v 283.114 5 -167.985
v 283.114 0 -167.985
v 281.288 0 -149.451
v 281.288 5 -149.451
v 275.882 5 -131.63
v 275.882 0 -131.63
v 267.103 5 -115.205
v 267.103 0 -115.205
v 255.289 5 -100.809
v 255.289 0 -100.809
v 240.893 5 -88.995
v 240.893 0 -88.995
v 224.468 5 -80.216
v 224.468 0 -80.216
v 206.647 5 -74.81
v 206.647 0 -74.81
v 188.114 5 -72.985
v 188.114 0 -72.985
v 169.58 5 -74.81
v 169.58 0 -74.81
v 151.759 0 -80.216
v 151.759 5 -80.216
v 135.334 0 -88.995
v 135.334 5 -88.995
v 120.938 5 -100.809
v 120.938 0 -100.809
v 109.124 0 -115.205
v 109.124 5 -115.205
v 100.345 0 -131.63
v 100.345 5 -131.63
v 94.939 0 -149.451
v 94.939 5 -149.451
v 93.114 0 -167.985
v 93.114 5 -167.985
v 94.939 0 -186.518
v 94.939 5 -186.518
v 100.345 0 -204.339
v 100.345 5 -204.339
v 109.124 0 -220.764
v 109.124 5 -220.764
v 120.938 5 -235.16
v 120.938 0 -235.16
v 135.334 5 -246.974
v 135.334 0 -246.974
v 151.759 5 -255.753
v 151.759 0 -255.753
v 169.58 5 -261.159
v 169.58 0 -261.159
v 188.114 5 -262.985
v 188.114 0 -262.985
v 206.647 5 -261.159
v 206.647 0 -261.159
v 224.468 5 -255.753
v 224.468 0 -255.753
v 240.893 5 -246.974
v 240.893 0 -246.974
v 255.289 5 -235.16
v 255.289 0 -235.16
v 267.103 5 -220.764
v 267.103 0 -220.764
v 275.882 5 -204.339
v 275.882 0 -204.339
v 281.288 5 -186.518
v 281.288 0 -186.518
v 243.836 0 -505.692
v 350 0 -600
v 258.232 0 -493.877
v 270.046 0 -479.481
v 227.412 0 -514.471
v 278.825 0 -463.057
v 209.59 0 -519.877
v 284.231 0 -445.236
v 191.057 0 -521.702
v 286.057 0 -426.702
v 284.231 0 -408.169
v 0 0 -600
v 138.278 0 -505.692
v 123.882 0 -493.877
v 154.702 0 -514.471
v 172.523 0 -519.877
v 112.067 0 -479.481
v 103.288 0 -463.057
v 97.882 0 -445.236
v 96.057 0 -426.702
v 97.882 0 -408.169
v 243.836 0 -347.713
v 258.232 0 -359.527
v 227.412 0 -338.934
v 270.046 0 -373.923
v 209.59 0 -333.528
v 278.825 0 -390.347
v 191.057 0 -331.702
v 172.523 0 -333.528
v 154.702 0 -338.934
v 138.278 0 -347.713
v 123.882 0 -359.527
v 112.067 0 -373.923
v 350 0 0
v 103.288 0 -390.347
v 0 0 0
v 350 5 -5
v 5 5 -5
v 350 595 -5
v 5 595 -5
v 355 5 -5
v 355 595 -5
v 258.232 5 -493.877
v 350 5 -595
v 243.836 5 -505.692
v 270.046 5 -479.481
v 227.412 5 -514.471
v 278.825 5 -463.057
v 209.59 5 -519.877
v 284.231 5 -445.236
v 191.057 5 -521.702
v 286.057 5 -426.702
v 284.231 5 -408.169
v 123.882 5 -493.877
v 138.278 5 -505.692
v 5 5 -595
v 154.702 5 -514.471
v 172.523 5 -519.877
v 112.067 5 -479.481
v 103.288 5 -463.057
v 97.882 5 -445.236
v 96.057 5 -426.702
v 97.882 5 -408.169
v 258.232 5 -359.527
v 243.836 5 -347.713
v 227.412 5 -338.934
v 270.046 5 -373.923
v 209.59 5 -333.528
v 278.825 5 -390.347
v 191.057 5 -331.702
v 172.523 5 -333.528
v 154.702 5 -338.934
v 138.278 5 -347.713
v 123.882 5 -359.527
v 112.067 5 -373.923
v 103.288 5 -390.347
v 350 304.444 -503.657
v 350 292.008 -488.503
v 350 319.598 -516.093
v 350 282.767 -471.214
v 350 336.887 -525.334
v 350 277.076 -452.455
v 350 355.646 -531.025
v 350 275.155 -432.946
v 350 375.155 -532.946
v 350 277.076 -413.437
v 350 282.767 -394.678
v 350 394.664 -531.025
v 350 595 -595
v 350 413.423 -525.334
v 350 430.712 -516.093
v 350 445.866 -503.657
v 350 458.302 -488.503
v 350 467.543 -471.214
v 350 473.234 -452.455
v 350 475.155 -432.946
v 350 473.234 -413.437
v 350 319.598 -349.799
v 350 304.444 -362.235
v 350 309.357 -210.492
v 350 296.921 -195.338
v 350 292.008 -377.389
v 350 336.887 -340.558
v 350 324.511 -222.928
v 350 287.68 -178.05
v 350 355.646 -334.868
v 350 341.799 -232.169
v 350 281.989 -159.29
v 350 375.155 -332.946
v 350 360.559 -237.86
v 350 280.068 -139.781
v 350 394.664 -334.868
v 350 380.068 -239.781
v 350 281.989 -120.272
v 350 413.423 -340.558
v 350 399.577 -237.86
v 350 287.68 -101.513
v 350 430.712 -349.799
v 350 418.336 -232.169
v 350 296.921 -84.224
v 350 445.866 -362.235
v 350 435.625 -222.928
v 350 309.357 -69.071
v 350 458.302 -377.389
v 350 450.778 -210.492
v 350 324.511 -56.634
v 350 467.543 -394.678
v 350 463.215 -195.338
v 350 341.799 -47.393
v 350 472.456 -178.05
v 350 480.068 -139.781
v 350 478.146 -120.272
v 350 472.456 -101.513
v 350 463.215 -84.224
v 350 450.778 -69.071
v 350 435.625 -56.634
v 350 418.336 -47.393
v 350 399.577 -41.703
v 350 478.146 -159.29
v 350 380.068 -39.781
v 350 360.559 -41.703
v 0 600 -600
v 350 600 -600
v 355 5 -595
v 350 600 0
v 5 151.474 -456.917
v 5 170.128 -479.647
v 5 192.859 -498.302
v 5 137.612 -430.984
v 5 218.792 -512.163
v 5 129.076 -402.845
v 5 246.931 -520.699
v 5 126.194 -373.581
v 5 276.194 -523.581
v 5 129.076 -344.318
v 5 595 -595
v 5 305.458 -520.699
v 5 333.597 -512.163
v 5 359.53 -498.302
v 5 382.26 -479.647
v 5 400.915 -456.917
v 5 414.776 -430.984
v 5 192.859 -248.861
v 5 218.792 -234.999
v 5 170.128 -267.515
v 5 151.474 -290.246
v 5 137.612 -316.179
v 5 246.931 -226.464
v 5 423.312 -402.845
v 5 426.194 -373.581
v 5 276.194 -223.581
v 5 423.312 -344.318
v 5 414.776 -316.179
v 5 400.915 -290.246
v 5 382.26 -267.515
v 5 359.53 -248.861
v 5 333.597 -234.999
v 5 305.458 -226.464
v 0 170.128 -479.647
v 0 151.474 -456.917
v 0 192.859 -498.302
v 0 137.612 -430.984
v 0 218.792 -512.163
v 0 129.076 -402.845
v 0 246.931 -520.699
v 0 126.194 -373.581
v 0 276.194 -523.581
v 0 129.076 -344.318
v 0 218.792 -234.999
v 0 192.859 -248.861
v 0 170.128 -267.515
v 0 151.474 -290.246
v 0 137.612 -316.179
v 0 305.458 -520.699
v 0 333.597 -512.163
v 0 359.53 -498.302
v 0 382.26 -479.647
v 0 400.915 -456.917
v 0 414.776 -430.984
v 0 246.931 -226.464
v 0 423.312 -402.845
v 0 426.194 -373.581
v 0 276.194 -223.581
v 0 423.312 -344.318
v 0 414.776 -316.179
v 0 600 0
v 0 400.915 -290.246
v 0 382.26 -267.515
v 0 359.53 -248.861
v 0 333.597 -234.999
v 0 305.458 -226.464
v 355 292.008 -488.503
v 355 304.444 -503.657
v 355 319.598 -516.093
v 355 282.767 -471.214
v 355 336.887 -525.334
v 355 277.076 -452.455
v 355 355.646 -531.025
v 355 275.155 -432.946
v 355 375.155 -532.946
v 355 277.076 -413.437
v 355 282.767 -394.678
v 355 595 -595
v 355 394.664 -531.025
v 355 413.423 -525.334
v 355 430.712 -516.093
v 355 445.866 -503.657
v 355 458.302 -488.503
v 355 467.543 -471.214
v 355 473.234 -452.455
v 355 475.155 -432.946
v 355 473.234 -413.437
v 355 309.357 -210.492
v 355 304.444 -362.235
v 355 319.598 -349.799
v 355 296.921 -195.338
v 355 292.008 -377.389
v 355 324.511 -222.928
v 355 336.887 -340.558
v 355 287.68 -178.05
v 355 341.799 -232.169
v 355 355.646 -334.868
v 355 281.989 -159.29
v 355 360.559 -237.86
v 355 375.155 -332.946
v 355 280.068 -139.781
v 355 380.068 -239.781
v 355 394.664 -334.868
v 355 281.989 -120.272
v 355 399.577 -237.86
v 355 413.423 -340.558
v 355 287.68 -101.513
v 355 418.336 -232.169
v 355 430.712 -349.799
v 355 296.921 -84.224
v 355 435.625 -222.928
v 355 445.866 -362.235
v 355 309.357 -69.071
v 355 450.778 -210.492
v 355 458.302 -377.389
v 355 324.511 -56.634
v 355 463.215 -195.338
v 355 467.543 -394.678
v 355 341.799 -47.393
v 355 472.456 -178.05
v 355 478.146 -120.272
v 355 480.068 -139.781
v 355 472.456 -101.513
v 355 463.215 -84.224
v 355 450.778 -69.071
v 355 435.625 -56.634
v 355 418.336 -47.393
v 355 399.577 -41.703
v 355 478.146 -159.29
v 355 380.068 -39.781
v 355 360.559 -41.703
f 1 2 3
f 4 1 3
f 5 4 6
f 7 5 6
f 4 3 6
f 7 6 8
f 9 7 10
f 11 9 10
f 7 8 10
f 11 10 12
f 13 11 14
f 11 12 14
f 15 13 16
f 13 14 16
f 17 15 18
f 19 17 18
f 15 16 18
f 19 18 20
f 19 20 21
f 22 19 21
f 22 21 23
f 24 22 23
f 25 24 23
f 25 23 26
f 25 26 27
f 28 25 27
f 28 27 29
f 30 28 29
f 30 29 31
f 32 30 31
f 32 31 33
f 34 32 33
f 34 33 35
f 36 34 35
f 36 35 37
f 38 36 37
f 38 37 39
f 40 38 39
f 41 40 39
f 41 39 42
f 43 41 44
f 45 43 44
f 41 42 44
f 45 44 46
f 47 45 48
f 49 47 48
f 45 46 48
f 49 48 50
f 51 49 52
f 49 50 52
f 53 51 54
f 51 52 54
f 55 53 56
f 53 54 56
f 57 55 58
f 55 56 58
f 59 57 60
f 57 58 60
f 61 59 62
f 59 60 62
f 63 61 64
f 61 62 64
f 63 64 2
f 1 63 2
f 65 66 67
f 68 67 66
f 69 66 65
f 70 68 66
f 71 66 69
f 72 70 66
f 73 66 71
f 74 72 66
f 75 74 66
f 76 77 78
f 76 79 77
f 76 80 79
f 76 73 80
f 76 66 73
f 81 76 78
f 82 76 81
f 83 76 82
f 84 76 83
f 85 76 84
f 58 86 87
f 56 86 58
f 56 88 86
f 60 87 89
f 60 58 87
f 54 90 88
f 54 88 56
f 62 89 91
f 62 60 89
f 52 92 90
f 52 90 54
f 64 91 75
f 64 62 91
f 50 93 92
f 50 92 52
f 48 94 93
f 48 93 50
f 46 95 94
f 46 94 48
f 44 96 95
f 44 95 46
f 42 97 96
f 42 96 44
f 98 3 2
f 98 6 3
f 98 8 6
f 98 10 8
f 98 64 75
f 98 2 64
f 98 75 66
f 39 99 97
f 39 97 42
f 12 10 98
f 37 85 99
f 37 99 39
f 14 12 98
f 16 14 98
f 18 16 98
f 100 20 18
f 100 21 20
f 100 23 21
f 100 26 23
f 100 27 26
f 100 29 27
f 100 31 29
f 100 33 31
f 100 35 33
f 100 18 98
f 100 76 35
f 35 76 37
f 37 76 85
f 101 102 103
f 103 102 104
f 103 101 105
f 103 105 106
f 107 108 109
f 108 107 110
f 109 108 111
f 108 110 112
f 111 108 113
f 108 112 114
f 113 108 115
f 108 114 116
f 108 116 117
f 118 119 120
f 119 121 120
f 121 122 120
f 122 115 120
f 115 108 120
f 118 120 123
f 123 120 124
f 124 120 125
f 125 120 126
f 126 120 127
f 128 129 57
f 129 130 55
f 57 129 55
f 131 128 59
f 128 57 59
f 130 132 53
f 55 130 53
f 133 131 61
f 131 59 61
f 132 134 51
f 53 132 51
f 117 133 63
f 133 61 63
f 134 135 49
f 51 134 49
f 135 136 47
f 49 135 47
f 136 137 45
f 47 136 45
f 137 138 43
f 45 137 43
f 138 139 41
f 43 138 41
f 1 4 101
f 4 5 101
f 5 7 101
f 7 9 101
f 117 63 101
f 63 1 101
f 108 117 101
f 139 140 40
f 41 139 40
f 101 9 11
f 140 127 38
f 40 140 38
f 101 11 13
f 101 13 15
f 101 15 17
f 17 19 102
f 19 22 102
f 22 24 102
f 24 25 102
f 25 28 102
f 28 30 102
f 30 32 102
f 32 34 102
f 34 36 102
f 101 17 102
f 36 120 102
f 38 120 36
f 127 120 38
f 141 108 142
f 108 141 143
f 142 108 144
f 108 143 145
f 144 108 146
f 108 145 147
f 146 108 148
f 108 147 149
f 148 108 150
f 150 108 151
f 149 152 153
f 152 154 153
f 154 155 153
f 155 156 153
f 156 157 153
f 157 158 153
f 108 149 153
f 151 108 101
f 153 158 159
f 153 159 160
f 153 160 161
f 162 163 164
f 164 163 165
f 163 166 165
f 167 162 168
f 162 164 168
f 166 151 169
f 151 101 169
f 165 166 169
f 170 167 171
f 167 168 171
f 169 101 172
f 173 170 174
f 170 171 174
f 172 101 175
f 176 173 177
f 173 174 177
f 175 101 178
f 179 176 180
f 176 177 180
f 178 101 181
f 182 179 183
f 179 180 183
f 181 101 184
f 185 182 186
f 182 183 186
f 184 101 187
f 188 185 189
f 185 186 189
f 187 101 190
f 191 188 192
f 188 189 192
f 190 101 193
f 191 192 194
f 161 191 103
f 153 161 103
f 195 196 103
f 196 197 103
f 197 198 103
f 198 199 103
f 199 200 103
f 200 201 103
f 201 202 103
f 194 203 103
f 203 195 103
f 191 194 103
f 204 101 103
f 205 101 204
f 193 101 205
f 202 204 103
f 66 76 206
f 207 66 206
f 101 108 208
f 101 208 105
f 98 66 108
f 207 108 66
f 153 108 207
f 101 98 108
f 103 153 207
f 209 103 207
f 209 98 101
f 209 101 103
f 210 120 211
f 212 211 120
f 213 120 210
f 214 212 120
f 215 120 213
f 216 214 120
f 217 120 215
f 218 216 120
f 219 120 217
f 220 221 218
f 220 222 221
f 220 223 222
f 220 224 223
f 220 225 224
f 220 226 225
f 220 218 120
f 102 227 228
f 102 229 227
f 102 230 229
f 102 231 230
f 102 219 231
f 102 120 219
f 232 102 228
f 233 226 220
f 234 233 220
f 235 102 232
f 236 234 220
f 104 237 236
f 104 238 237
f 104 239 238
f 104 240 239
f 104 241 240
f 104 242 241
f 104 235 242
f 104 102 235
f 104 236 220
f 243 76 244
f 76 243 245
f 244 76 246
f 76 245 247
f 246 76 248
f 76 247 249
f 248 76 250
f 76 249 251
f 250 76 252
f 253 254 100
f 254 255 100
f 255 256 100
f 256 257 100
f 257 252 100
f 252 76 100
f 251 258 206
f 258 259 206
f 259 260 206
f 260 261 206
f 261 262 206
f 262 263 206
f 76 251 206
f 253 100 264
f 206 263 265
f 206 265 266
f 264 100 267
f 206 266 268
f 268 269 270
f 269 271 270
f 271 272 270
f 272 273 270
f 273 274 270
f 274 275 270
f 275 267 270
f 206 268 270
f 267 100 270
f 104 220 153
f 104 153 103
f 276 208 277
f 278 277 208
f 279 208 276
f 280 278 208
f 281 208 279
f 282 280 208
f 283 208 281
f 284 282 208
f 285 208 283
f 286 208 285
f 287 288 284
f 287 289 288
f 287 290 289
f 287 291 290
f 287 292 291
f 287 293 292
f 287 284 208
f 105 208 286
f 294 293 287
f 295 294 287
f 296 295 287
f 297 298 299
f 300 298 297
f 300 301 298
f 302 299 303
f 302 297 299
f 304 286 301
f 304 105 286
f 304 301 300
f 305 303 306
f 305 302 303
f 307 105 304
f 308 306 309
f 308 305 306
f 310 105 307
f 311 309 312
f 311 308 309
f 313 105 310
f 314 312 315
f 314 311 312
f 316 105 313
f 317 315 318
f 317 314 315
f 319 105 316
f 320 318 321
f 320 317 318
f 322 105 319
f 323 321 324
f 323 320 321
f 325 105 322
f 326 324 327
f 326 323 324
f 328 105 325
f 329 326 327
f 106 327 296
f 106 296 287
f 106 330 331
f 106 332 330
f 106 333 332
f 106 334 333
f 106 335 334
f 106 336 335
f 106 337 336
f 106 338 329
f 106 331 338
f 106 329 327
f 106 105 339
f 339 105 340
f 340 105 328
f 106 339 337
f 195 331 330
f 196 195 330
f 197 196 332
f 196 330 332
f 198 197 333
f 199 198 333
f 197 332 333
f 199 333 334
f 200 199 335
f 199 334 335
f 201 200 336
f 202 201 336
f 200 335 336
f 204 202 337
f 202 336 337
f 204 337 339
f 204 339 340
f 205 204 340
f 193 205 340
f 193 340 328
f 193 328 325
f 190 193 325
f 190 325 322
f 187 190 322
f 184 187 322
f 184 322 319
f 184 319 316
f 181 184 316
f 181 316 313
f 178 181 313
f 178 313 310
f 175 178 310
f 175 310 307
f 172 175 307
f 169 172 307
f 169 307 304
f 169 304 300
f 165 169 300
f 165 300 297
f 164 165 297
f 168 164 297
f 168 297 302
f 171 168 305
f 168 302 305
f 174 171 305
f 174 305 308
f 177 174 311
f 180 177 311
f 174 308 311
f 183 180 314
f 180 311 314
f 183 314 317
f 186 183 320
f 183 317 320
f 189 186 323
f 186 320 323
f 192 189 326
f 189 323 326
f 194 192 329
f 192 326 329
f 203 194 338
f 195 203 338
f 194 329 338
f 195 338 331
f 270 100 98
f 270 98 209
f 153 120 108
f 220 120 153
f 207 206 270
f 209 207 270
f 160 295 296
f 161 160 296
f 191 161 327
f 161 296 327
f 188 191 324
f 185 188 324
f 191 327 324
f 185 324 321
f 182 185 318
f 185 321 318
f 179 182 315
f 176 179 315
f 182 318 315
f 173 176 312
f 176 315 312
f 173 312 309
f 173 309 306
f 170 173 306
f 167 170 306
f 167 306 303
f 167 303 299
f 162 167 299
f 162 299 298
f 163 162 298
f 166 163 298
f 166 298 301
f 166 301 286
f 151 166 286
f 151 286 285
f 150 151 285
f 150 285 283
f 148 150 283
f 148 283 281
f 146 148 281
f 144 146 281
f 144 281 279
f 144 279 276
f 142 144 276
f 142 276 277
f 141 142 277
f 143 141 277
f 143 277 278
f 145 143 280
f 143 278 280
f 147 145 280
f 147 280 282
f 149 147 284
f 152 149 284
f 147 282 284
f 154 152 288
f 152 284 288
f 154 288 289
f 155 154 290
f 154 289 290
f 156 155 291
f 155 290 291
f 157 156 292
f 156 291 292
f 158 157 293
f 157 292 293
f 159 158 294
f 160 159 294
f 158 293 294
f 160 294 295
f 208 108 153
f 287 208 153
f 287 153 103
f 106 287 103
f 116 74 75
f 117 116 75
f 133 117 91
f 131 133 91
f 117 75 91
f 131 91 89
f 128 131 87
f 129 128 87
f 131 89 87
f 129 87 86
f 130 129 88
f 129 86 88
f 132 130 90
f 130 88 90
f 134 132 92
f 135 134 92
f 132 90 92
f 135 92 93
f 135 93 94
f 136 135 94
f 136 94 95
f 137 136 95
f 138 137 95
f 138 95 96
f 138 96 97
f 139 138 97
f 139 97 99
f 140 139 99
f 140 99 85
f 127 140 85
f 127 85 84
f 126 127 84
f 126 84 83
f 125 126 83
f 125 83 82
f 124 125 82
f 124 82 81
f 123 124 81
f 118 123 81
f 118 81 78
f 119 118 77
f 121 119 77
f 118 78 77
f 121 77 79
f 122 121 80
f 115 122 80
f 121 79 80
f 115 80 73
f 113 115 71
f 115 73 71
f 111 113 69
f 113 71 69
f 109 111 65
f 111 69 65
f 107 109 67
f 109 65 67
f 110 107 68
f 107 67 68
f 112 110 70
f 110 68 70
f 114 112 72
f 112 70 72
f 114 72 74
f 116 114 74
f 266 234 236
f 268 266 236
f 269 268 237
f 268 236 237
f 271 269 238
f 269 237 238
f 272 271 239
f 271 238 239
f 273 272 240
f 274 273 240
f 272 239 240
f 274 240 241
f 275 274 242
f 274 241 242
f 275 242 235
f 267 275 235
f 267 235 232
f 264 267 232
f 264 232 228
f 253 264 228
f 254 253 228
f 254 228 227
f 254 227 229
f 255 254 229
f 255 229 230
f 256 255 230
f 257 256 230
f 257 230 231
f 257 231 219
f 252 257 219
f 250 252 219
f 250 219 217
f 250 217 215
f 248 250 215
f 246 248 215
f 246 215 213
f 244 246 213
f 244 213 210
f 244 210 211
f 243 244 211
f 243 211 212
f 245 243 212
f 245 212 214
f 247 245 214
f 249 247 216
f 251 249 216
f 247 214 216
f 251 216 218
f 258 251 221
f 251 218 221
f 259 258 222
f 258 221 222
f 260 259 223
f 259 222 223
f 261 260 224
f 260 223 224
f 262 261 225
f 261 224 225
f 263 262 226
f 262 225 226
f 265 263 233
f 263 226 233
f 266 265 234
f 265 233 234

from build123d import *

# Parameters (mm, degrees)
F0_W      = 600
F0_H      = 600
F0_W_2    = 590.0000002235
F0_H_2    = 590.0000002235
F1_DEPTH  = 350
F2_DEPTH  = 5
F3_R      = 150
F4_DEPTH  = 25
F5_R      = 95
F6_DEPTH  = 25
F7_W      = 590.0000002235
F7_H      = 590.0000002235
F8_DEPTH  = 5
F12_R     = 100
F13_DEPTH = 25


# Not quite as in the source:
# - a feature names something its author has since deleted; it is built from what else it names
# - the program builds the solid bodies; features that only make, move or delete a surface that nothing else refers to are left out


with BuildPart() as f1:
    # F0 (on Right) → F1 (new body)
    with BuildSketch(Plane.YZ):
        with Locations((300, -300)):
            Rectangle(F0_W, F0_H)
        with Locations((300, -300)):
            Rectangle(F0_W_2, F0_H_2, mode=Mode.SUBTRACT)
    extrude(amount=F1_DEPTH)

    # F0 (on Right) → F2 (join)
    with BuildSketch(Plane.YZ):
        with Locations((300, -300)):
            Rectangle(F0_W_2, F0_H_2)
    extrude(amount=F2_DEPTH)

    # F3 (on face) → F4 (cut)
    with BuildSketch(Plane.YZ.offset(5)):
        with Locations((276.1940956116, -373.5814094543)):
            Circle(F3_R)
    extrude(amount=-F4_DEPTH, mode=Mode.SUBTRACT)

    # F5 (on face) → F6 (cut)
    with BuildSketch(Plane.XZ):
        with Locations((191.0568624735, -426.7022567097)):
            Circle(F5_R)
        with Locations((188.1135240477, -167.9845607586)):
            Circle(F5_R)
    extrude(amount=-F6_DEPTH, mode=Mode.SUBTRACT)


with BuildPart() as f8:
    # F7 (on face) → F8 (new body)
    with BuildSketch(Plane.YZ.offset(350)):
        with Locations((300, -300)):
            Rectangle(F7_W, F7_H)
    extrude(amount=F8_DEPTH)

    # F12 (on face) → F13 (cut)
    with BuildSketch(Plane.YZ.offset(355)):
        with Locations((380.0676831018, -139.7812012694)):
            Circle(F12_R)
        with Locations((375.1550018787, -432.9461210735)):
            Circle(F12_R)
    extrude(amount=-F13_DEPTH, mode=Mode.SUBTRACT)


solid = Compound([f1.part, f8.part])
